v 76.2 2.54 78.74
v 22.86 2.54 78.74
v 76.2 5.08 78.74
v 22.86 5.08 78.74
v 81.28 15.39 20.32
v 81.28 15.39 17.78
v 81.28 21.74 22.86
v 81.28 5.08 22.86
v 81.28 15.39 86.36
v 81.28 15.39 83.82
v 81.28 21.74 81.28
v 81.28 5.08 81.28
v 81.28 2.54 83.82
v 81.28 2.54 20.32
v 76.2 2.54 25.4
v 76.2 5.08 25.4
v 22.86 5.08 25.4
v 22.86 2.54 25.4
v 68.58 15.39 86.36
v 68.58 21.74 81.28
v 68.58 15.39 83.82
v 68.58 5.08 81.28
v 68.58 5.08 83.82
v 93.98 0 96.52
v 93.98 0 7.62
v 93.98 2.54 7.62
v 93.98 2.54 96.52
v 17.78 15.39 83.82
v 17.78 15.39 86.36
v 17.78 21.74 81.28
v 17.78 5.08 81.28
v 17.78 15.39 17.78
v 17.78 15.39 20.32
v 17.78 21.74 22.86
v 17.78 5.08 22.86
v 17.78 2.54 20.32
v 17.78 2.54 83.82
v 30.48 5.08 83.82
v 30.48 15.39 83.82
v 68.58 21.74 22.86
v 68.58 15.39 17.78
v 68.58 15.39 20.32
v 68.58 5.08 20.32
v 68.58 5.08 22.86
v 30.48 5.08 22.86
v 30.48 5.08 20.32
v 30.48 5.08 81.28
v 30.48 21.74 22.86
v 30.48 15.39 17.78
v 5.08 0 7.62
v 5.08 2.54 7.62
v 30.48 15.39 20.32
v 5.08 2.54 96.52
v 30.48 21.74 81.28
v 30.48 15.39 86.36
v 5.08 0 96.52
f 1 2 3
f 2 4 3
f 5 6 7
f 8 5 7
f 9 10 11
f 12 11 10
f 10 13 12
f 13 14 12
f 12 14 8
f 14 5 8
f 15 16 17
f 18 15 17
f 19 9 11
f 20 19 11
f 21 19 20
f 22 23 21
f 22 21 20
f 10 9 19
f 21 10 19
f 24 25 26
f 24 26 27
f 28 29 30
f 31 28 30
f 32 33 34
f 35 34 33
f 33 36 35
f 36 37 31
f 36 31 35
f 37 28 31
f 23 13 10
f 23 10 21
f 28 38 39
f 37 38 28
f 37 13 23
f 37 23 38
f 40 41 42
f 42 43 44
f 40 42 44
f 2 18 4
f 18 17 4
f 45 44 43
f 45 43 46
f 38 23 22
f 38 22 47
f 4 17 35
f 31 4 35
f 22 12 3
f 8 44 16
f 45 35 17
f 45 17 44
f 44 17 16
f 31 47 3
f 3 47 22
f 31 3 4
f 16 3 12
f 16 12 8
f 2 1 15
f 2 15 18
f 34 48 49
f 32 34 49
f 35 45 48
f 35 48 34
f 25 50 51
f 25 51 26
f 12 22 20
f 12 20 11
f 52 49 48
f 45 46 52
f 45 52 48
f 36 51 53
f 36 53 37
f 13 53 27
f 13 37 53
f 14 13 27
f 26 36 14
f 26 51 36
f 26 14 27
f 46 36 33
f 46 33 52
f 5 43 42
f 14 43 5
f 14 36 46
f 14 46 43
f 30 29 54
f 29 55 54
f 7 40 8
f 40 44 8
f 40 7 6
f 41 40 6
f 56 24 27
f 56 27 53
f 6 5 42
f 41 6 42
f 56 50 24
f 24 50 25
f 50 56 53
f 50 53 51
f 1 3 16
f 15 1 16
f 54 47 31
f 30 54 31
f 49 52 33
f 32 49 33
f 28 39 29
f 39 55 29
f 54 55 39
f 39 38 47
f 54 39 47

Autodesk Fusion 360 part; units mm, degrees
sketch "Sketch1" plane through (0, 0, 0) normal (0, 1, 0) x (1, 0, 0)
  line L0 (5.08, -7.62) -> (93.98, -7.62)
  line L1 (93.98, -7.62) -> (93.98, -96.52)
  line L2 (93.98, -96.52) -> (5.08, -96.52)
  line L3 (5.08, -96.52) -> (5.08, -7.62)
  dimension "d1" = 88.9
  dimension "d2" = 88.9
extrude "Extrude1" add sketch "Sketch1" along normal blind 2.54
sketch "Sketch2" plane through (0, 2.54, 0) normal (0, 1, 0) x (-1, 0, 0)
  line L0 (-5.08, 96.52) -> (-93.98, 96.52)
  line L1 (-93.98, 96.52) -> (-93.98, 7.62)
  line L2 (-93.98, 7.62) -> (-5.08, 7.62)
  line L3 (-5.08, 7.62) -> (-5.08, 96.52)
  line L4 (-17.78, 20.32) -> (-81.28, 20.32)
  line L5 (-81.28, 20.32) -> (-81.28, 83.82)
  line L6 (-81.28, 83.82) -> (-17.78, 83.82)
  line L7 (-17.78, 83.82) -> (-17.78, 20.32)
  dimension "d5" = 63.5
  dimension "d6" = 63.5
  dimension "d7" = 12.7
  dimension "d8" = 12.7
extrude "Extrude2" add sketch "Sketch2" along normal blind 2.54 contours L4 L5 L6 L7
sketch "Sketch3" plane through (0, 5.08, 0) normal (0, 1, 0) x (-1, 0, 0)
  line L0 (-17.78, 83.82) -> (-81.28, 83.82)
  line L1 (-81.28, 83.82) -> (-81.28, 20.32)
  line L2 (-81.28, 20.32) -> (-17.78, 20.32)
  line L3 (-17.78, 20.32) -> (-17.78, 83.82)
  line L4 (-17.78, 20.32) -> (-30.48, 20.32)
  line L5 (-30.48, 20.32) -> (-30.48, 22.86)
  line L6 (-30.48, 22.86) -> (-17.78, 22.86)
  line L7 (-17.78, 22.86) -> (-17.78, 20.32)
  line L8 (-81.28, 20.32) -> (-68.58, 20.32)
  line L9 (-68.58, 20.32) -> (-68.58, 22.86)
  line L10 (-68.58, 22.86) -> (-81.28, 22.86)
  line L11 (-81.28, 22.86) -> (-81.28, 20.32)
  line L12 (-17.78, 83.82) -> (-30.48, 83.82)
  line L13 (-30.48, 83.82) -> (-30.48, 81.28)
  line L14 (-30.48, 81.28) -> (-17.78, 81.28)
  line L15 (-17.78, 81.28) -> (-17.78, 83.82)
  line L16 (-81.28, 83.82) -> (-68.58, 83.82)
  line L17 (-68.58, 83.82) -> (-68.58, 81.28)
  line L18 (-68.58, 81.28) -> (-81.28, 81.28)
  line L19 (-81.28, 81.28) -> (-81.28, 83.82)
extrude "Extrude3" add sketch "Sketch3" along normal blind 10.31 contours L0 L3 L12 L13 L14 L15 | L0 L1 L16 L17 L18 L19 | L2 L3 L4 L5 L6 L7 | L1 L2 L8 L9 L10 L11
sketch "Sketch4" plane through (0, 15.39, 0) normal (0, 1, 0) x (-1, 0, 0)
  line L0 (-81.28, 81.28) -> (-68.58, 81.28)
  line L1 (-68.58, 81.28) -> (-68.58, 83.82)
  line L2 (-68.58, 83.82) -> (-81.28, 83.82)
  line L3 (-81.28, 83.82) -> (-81.28, 81.28)
  line L4 (-30.48, 81.28) -> (-17.78, 81.28)
  line L5 (-17.78, 81.28) -> (-17.78, 86.36)
  line L6 (-17.78, 86.36) -> (-30.48, 86.36)
  line L7 (-30.48, 86.36) -> (-30.48, 81.28)
  line L8 (-17.78, 22.86) -> (-30.48, 22.86)
  line L9 (-30.48, 22.86) -> (-30.48, 17.78)
  line L10 (-30.48, 17.78) -> (-17.78, 17.78)
  line L11 (-17.78, 17.78) -> (-17.78, 22.86)
  line L12 (-68.58, 22.86) -> (-81.28, 22.86)
  line L13 (-81.28, 22.86) -> (-81.28, 17.78)
  line L14 (-81.28, 17.78) -> (-68.58, 17.78)
  line L15 (-68.58, 17.78) -> (-68.58, 22.86)
  line L16 (-81.28, 81.28) -> (-68.58, 81.28)
  line L17 (-68.58, 81.28) -> (-68.58, 86.36)
  line L18 (-68.58, 86.36) -> (-81.28, 86.36)
  line L19 (-81.28, 86.36) -> (-81.28, 81.28)
  dimension "d17" = 5.08
  dimension "d18" = 5.08
  dimension "d19" = 5.08
  dimension "d20" = 5.08
extrude "Extrude4" add sketch "Sketch4" along normal blind 6.35
sketch "Sketch5" plane through (81.28, 0, 0) normal (1, 0, 0) x (0, 0, -1)
  line L0 (-83.82, 2.54) -> (-20.32, 2.54)
  line L1 (-20.32, 2.54) -> (-20.32, 15.39)
  line L2 (-20.32, 15.39) -> (-17.78, 15.39)
  line L3 (-17.78, 15.39) -> (-17.78, 21.74)
  line L4 (-17.78, 21.74) -> (-22.86, 21.74)
  line L5 (-22.86, 21.74) -> (-22.86, 5.08)
  line L6 (-22.86, 5.08) -> (-81.28, 5.08)
  line L7 (-81.28, 5.08) -> (-81.28, 21.74)
  line L8 (-81.28, 21.74) -> (-86.36, 21.74)
  line L9 (-86.36, 21.74) -> (-86.36, 15.39)
  line L10 (-86.36, 15.39) -> (-83.82, 15.39)
  line L11 (-83.82, 15.39) -> (-83.82, 2.54)
  line L12 (-86.36, 15.39) -> (-81.28, 21.74)
  line L13 (-86.36, 21.74) -> (-86.36, 15.39)
  line L14 (-81.28, 21.74) -> (-86.36, 21.74)
  line L15 (-22.86, 21.74) -> (-17.78, 15.39)
  line L16 (-17.78, 21.74) -> (-22.86, 21.74)
extrude "Extrude5" cut sketch "Sketch5" against normal blind 63.5 contours L8 L9 L12 L13 L14 | L3 L4 L15 L16
sketch "Sketch6" plane through (0, 5.08, 0) normal (0, 1, 0) x (-1, 0, 0)
  line L0 (-30.48, 81.28) -> (-30.48, 83.82)
  line L1 (-30.48, 83.82) -> (-68.58, 83.82)
  line L2 (-68.58, 83.82) -> (-68.58, 81.28)
  line L3 (-68.58, 81.28) -> (-81.28, 81.28)
  line L4 (-81.28, 81.28) -> (-81.28, 22.86)
  line L5 (-81.28, 22.86) -> (-68.58, 22.86)
  line L6 (-68.58, 22.86) -> (-68.58, 20.32)
  line L7 (-68.58, 20.32) -> (-30.48, 20.32)
  line L8 (-30.48, 20.32) -> (-30.48, 22.86)
  line L9 (-30.48, 22.86) -> (-17.78, 22.86)
  line L10 (-17.78, 22.86) -> (-17.78, 81.28)
  line L11 (-17.78, 81.28) -> (-30.48, 81.28)
  line L12 (-22.86, 78.74) -> (-76.2, 78.74)
  line L13 (-76.2, 78.74) -> (-76.2, 25.4)
  line L14 (-76.2, 25.4) -> (-22.86, 25.4)
  line L15 (-22.86, 25.4) -> (-22.86, 78.74)
extrude "Extrude6" cut sketch "Sketch6" against normal blind 2.54 contours L12 L13 L14 L15
equation "d11 = 0.4 in + 0.15 mm"
